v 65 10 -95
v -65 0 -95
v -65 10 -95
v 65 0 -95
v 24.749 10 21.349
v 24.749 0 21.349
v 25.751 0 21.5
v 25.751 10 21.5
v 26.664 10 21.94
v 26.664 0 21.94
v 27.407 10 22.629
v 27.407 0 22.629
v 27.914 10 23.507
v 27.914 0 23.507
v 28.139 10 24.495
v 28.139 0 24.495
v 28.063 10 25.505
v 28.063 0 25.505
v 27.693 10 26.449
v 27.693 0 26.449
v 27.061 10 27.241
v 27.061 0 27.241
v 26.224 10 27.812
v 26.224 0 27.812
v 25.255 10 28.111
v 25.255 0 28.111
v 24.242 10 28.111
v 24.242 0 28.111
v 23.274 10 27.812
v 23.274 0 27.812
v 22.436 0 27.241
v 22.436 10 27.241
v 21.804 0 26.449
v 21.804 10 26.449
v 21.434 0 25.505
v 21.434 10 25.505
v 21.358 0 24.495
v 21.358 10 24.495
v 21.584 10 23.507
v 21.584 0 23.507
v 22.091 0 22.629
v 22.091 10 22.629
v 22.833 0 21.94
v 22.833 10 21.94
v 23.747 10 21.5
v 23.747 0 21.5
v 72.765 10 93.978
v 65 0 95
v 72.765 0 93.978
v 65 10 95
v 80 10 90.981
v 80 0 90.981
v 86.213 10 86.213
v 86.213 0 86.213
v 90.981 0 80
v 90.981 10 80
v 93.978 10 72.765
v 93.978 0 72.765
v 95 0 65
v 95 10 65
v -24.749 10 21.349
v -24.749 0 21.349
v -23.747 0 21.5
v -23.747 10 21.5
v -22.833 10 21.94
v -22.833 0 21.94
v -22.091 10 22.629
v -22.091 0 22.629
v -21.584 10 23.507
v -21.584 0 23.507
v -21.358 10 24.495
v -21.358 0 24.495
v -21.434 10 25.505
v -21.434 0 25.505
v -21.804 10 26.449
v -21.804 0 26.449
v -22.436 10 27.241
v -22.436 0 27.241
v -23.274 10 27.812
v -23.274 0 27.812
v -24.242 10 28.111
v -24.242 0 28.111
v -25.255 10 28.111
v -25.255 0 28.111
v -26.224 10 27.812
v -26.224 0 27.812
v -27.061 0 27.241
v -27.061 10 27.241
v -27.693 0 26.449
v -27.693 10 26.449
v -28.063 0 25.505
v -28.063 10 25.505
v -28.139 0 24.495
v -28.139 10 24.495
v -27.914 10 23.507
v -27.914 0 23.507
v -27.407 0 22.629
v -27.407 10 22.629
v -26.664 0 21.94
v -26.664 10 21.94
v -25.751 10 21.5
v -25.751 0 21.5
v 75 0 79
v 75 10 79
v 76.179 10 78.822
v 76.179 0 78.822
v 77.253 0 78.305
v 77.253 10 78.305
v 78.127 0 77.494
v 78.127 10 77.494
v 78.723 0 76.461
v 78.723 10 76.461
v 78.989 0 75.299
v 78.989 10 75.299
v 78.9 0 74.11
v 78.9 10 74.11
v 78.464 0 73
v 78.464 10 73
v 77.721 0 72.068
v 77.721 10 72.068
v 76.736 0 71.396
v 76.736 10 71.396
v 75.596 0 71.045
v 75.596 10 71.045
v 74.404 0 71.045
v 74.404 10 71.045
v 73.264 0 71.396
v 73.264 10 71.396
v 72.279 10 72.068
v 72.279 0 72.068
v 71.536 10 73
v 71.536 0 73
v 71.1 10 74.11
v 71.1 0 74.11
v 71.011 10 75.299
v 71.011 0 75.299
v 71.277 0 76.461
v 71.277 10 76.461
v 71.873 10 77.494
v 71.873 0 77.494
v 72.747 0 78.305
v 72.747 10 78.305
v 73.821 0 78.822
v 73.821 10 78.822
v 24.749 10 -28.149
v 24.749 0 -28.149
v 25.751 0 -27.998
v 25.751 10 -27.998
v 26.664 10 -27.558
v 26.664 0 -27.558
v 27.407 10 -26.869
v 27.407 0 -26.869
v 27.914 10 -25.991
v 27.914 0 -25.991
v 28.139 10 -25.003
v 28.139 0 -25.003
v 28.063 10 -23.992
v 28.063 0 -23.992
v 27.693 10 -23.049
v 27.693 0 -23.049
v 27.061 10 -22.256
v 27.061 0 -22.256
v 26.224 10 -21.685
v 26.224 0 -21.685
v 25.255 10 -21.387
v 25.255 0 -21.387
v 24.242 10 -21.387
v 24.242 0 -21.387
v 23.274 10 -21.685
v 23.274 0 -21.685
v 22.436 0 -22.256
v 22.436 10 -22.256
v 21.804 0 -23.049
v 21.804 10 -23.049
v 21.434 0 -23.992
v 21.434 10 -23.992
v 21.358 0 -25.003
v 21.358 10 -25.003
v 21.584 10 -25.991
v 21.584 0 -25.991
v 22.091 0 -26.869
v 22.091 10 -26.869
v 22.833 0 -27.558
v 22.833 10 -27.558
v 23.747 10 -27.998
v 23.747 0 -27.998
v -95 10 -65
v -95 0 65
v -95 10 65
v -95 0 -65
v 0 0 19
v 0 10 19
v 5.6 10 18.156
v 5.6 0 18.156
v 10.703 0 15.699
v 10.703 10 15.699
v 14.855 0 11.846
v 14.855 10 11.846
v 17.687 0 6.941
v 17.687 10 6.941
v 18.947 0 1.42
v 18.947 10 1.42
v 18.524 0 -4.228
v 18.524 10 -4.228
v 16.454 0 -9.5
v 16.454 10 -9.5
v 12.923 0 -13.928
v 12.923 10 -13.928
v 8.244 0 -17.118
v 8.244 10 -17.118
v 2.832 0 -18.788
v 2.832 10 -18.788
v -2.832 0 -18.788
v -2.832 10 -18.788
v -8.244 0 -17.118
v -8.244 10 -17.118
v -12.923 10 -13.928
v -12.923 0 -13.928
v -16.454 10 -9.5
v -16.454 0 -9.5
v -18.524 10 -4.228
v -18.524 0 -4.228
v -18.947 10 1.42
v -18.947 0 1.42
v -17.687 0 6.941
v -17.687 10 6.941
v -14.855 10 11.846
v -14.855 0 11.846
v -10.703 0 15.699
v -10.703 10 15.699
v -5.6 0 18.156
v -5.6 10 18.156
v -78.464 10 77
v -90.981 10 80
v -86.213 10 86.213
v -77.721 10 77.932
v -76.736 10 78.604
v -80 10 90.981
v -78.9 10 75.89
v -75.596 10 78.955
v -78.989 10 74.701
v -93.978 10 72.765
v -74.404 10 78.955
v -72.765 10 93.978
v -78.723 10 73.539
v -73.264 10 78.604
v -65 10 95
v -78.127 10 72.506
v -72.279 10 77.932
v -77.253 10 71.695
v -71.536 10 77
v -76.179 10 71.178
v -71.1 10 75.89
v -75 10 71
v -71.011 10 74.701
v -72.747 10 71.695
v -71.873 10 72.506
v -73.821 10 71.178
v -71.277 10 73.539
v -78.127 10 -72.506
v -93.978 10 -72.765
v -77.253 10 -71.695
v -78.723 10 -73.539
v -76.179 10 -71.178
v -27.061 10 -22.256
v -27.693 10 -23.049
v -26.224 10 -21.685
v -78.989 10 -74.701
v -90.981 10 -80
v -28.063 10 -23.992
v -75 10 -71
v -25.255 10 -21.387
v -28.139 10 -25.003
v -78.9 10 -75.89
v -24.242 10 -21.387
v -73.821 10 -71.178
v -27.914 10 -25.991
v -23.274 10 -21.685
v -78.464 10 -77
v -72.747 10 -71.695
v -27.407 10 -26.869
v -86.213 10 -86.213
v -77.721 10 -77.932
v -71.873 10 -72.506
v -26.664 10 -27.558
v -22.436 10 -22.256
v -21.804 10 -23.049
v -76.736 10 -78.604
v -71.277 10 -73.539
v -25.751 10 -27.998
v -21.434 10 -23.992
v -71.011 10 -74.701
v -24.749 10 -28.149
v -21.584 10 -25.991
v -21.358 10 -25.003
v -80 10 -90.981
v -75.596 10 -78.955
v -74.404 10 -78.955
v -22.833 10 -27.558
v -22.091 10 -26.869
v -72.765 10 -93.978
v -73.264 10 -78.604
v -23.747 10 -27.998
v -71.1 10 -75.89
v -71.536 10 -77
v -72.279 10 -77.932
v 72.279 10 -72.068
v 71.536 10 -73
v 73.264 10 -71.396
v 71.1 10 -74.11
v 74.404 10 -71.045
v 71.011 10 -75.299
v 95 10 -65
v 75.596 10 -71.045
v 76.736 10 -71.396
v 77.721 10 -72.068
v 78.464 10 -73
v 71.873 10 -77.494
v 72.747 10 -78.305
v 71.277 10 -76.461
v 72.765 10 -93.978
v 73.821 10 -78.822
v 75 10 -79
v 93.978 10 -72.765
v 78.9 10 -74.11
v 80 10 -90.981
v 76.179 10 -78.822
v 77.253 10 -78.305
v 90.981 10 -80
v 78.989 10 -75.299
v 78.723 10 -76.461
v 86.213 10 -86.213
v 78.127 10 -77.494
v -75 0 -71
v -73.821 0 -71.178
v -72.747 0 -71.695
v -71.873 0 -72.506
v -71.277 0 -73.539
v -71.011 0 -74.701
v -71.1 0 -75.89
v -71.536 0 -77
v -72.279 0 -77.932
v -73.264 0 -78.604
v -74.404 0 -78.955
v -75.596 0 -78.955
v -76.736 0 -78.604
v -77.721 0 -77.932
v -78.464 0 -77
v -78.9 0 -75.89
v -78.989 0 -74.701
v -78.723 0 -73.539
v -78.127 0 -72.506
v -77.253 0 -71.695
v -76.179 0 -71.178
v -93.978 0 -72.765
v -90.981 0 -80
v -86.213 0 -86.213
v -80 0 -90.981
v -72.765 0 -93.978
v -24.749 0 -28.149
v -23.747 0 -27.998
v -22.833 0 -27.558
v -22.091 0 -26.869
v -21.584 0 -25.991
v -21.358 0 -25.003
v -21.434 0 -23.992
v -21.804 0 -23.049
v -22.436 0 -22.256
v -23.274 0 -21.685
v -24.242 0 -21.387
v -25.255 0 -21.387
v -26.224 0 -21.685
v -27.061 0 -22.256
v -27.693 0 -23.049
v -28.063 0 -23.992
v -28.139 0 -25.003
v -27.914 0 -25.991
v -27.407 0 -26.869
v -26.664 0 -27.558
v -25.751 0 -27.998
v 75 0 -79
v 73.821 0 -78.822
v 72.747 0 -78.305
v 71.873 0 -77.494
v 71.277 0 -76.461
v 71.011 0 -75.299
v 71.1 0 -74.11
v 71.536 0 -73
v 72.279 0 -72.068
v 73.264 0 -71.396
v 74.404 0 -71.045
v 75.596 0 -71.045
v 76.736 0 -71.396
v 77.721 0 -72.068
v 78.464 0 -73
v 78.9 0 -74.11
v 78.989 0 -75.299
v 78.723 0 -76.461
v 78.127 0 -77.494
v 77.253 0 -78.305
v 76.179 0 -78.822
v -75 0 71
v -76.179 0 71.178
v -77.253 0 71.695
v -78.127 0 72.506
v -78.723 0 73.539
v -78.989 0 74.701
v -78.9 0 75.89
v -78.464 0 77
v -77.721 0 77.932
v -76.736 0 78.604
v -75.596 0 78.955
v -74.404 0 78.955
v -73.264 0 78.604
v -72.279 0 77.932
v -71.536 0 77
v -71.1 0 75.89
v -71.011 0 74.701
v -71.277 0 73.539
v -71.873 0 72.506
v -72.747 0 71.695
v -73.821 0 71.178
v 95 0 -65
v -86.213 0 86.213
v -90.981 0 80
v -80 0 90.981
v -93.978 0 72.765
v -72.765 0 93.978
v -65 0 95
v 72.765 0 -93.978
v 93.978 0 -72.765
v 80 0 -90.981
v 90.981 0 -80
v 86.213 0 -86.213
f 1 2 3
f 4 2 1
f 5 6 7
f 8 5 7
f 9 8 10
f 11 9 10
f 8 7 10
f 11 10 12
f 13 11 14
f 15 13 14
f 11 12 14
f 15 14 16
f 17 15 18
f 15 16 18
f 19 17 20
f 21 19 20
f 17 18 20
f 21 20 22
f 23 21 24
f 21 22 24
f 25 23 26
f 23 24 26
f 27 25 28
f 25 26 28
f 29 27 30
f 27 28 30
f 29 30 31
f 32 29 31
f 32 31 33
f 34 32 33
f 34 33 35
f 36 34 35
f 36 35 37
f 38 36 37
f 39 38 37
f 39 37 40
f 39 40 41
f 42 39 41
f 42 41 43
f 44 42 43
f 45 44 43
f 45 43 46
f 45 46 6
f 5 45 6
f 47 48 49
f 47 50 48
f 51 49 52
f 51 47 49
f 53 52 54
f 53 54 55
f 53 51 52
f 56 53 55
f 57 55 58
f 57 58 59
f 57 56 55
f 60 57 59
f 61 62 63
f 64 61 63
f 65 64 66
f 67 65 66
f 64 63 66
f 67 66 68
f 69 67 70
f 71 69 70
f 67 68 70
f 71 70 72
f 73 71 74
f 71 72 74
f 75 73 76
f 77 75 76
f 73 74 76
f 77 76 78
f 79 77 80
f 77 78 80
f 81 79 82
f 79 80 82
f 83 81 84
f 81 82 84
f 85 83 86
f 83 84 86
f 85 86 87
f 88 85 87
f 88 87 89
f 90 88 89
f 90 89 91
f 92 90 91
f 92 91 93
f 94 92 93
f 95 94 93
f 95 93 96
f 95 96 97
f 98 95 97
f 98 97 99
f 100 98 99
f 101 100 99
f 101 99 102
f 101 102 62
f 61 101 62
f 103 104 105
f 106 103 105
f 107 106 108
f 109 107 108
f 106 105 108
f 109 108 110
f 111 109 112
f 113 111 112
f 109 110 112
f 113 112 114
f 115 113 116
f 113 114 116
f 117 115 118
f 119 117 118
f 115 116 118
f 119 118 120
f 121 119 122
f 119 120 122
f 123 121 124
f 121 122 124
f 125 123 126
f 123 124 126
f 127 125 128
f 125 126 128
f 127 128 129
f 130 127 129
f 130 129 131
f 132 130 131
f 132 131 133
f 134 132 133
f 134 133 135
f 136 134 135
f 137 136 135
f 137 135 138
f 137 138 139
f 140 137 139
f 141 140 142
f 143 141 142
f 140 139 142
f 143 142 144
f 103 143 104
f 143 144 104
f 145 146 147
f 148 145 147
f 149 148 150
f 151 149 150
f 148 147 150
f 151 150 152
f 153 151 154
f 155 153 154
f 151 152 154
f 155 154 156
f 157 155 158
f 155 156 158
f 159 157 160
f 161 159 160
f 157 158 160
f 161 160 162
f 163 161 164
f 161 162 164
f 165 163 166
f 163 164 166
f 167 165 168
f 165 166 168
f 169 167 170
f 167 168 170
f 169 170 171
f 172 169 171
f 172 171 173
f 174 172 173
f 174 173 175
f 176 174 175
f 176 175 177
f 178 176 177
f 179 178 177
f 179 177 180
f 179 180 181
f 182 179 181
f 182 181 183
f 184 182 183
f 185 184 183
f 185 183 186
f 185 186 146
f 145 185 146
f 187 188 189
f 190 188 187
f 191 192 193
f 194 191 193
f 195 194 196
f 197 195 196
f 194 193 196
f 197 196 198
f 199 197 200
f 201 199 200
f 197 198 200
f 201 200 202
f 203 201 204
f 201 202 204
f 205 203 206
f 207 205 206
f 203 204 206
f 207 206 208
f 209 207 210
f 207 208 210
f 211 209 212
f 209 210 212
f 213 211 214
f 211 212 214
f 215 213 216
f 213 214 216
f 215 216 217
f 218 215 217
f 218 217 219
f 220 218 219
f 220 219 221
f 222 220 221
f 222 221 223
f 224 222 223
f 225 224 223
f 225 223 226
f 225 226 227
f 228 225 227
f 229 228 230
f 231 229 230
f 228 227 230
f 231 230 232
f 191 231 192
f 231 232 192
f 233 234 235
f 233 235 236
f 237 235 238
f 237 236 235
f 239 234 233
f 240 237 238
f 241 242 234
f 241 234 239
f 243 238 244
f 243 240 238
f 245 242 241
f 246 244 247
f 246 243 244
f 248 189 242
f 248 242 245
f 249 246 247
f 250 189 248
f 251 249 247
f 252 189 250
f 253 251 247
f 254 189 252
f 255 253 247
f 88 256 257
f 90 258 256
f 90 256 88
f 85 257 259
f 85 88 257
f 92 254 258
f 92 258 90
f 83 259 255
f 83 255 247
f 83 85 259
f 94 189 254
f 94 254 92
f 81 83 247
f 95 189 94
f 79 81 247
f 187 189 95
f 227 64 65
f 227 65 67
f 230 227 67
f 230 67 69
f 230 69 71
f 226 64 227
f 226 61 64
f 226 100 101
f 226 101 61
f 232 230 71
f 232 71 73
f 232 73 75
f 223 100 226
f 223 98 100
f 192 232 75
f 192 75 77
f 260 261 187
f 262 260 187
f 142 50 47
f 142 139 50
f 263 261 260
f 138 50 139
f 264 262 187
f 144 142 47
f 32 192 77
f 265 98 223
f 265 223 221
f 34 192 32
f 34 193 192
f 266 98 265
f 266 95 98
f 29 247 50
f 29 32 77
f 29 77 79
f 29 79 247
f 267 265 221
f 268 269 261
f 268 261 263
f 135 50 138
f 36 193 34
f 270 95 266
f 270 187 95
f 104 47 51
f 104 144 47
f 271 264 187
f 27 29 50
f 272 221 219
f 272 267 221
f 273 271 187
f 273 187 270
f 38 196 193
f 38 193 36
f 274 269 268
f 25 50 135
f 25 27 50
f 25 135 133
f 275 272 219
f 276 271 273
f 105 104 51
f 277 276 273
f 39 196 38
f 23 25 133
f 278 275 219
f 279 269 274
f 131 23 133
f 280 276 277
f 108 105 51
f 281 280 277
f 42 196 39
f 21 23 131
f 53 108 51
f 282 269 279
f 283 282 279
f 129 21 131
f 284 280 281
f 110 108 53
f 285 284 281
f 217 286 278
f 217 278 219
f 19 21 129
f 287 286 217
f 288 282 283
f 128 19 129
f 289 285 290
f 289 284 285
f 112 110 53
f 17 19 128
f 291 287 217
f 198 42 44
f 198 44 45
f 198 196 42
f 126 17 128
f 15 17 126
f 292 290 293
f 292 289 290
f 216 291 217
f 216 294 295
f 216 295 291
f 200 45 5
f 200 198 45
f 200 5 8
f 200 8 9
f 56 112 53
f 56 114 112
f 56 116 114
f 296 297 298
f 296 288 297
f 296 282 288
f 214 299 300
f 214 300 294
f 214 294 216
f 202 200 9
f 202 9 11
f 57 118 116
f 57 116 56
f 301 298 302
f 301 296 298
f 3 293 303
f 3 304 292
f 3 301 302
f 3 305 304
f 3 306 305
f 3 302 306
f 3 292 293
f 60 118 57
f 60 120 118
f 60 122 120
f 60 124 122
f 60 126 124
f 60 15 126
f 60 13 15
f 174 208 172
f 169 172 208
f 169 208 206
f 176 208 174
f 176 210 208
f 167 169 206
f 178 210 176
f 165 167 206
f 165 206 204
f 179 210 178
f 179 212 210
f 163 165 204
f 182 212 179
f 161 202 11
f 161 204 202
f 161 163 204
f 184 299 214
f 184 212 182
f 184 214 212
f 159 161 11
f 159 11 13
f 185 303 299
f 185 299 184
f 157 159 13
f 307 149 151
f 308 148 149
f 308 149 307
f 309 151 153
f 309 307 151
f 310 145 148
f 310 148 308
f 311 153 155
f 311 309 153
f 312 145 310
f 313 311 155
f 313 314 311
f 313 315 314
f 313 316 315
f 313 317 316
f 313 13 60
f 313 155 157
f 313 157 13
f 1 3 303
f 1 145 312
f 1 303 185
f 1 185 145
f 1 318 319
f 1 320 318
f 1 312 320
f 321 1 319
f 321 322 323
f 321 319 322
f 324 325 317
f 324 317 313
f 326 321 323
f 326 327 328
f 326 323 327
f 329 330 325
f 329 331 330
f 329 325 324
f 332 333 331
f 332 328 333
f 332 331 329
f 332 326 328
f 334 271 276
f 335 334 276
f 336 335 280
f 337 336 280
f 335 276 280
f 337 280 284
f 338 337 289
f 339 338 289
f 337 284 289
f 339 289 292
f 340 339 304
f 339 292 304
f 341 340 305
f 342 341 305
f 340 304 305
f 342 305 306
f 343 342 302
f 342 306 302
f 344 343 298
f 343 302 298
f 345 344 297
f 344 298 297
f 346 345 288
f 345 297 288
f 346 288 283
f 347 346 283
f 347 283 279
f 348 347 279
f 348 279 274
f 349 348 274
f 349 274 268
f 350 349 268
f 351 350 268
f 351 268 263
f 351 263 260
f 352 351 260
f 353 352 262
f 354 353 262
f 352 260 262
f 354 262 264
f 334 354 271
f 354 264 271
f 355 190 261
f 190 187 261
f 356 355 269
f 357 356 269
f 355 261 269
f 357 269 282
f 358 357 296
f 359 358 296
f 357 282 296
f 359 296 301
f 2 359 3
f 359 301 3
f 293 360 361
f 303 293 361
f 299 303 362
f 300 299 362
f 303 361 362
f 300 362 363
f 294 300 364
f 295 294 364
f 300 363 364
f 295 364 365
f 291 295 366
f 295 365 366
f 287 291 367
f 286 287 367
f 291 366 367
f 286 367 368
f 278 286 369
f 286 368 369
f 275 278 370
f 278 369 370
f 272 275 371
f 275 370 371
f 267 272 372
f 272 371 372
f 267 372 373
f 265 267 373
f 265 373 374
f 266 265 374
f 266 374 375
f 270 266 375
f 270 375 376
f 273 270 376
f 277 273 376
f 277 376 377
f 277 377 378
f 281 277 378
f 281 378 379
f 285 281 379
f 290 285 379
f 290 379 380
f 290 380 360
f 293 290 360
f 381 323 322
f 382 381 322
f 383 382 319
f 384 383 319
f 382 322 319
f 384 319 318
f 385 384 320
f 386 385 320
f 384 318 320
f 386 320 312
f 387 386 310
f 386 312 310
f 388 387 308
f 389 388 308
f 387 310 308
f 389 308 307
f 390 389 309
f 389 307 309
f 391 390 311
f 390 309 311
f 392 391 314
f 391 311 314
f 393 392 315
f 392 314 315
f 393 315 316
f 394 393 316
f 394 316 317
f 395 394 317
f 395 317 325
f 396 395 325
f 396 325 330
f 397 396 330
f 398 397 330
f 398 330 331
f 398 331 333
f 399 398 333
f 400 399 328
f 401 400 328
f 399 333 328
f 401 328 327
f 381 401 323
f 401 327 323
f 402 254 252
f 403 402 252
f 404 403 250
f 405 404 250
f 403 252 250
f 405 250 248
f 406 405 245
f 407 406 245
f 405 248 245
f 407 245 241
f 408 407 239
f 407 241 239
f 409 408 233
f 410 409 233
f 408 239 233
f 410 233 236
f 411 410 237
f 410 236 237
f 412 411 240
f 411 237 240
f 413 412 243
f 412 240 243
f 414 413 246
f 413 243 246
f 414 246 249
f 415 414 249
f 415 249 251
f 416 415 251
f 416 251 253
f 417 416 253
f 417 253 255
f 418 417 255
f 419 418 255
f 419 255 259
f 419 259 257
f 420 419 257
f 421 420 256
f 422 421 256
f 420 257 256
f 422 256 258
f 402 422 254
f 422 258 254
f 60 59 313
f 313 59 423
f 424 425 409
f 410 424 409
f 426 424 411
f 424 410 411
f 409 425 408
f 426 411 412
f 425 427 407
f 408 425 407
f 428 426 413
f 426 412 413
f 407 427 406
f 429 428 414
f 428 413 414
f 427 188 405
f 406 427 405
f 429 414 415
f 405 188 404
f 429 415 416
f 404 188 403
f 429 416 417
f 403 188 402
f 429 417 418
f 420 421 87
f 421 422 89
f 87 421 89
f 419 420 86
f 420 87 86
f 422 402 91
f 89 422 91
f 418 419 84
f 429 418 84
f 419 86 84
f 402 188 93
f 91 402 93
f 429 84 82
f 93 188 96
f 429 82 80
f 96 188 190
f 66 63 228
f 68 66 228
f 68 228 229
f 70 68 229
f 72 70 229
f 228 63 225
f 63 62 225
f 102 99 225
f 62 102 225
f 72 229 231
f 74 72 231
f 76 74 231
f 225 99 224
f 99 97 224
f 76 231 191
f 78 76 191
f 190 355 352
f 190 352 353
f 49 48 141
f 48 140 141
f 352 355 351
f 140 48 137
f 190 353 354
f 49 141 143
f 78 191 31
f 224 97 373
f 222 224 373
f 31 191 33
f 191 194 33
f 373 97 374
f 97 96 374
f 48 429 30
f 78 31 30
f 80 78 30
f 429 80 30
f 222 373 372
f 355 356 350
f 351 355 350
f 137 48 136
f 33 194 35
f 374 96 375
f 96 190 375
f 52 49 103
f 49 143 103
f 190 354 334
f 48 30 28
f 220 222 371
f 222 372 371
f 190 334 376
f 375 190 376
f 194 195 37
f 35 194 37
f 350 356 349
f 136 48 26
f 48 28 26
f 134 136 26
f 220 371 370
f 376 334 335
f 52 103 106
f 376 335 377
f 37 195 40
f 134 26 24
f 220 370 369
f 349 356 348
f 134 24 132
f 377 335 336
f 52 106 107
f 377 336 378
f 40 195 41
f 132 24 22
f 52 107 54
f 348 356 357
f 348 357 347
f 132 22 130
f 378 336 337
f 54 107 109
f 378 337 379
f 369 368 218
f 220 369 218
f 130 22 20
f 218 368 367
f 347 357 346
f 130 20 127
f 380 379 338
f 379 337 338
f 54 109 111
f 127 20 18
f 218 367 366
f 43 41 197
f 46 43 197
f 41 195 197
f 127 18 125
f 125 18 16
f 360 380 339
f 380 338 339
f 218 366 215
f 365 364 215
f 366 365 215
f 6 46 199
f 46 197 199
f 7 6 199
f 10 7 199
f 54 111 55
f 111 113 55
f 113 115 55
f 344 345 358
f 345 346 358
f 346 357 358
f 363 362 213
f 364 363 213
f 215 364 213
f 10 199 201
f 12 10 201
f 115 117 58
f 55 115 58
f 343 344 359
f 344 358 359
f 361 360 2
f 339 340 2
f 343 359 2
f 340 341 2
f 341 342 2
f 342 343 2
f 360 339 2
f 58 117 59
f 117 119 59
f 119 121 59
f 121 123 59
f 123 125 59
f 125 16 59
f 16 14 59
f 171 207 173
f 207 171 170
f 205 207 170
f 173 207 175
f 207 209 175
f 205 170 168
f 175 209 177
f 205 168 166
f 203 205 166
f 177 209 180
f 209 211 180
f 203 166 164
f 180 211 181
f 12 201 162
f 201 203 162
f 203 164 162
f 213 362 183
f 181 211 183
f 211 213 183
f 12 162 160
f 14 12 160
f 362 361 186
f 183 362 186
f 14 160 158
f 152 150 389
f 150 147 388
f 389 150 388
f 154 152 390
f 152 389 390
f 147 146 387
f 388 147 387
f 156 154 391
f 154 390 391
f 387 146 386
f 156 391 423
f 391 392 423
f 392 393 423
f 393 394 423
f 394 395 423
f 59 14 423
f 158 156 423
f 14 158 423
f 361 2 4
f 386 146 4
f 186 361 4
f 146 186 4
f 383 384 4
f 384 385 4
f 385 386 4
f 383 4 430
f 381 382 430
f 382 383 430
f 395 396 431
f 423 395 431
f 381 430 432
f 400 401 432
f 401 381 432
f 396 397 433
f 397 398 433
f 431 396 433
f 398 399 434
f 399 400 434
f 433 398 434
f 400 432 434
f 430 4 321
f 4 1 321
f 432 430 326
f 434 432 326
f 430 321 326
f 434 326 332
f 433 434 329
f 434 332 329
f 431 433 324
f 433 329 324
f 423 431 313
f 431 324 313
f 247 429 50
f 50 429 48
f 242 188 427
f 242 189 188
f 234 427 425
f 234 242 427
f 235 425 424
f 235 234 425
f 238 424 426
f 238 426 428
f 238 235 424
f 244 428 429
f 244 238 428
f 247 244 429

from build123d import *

# Parameters (mm, degrees)
SKETCH2_W             = 190
SKETCH2_H             = 190
EXTRUDE1_DEPTH        = 10
SKETCH3_R             = 19
SKETCH3_R_2           = 4
EXTRUDE2_DEPTH        = 10
FILLET1_R             = 30
M8_TAPPED_HOLE1_D     = 6.8
M8_TAPPED_HOLE1_DEPTH = 19.75
M8_TAPPED_HOLE1_TIP   = 2.042926105


with BuildPart() as part:
    # Sketch2 → Extrude1 (new body)
    with BuildSketch(Plane(origin=(0, 0, 0), x_dir=(1, 0, 0), z_dir=(0, 1, 0))):
        Rectangle(SKETCH2_W, SKETCH2_H)
    extrude(amount=EXTRUDE1_DEPTH)

    # Sketch3 → Extrude2 (cut)
    with BuildSketch(Plane(origin=(0, 10, 0), x_dir=(1, 0, 0), z_dir=(0, 1, 0))):
        with Locations(Location((0, 0, 0), (0, 0, 270))):
            Circle(SKETCH3_R)
        with Locations(Location((-75, 75, 0), (0, 0, 270))):
            Circle(SKETCH3_R_2)
        with Locations(Location((75, 75, 0), (0, 0, 90))):
            Circle(SKETCH3_R_2)
        with Locations(Location((75, -75, 0), (0, 0, 270))):
            Circle(SKETCH3_R_2)
        with Locations(Location((-75, -75, 0), (0, 0, 90))):
            Circle(SKETCH3_R_2)
    extrude(amount=-EXTRUDE2_DEPTH, mode=Mode.SUBTRACT)

    # Fillet1
    fillet1_edges = [part.edges().sort_by_distance(p)[0] for p in [
        (-95, 5, -95),
        (95, 5, -95),
        (95, 5, 95),
        (-95, 5, 95),
    ]]
    fillet(fillet1_edges, radius=FILLET1_R)

    # M8 Tapped Hole1
    with Locations(Plane(origin=(-24.748737342, 10, -24.748737342), x_dir=(0, 0, 1), z_dir=(0, 1, 0))):
        with Locations((0, 0), (0, 49.497474684), (49.497474684, 0), (49.497474684, 49.497474684)):
            Hole(M8_TAPPED_HOLE1_D / 2, depth=M8_TAPPED_HOLE1_DEPTH)
            with Locations((0, 0, -(M8_TAPPED_HOLE1_DEPTH + M8_TAPPED_HOLE1_TIP / 2))):  # 118° drill point
                Cone(0, M8_TAPPED_HOLE1_D / 2, M8_TAPPED_HOLE1_TIP, mode=Mode.SUBTRACT)


solid = part.part
